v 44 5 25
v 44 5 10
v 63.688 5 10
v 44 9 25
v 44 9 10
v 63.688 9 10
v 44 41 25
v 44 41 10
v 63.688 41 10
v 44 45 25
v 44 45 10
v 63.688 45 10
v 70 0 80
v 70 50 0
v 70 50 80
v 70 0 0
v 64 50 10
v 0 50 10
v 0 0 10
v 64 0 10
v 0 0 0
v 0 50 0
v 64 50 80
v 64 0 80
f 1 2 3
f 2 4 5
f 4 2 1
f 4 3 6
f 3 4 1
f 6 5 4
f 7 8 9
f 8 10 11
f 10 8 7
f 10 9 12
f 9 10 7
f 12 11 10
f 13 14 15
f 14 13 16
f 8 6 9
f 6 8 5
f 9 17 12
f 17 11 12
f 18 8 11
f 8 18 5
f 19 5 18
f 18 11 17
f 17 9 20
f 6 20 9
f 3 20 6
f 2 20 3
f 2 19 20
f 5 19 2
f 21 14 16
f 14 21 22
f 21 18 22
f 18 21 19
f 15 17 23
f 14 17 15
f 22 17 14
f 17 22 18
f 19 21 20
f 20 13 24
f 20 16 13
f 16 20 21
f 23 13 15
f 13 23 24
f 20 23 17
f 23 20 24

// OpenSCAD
$fn = 32;

// ----------------------------------------------------------------------
// Rib bracket: 2-gusset L bracket
// ----------------------------------------------------------------------

// --- parameters (mm) ---
base_l = 70;              // foot length, X
base_w = 50;              // foot width, Y
base_t = 10;              // foot thickness
plate_t = 6;              // upright plate thickness
plate_h = 80;             // overall height
gus_l = 20;               // gusset leg along the foot
gus_h = 16;               // gusset height
gus_t = 4;                // gusset thickness
gus_edge = 5;             // gusset margin from the foot edge
n_gus = 2;                // gusset count

gus_pitch = (base_w - 2 * gus_edge - gus_t) / (n_gus - 1);  // gusset pitch

union() {
  cube([base_l, base_w, base_t]);
  translate([base_l - plate_t, 0, base_t - 1])
    cube([plate_t, base_w, plate_h - base_t + 1]);
  for (i = [0 : n_gus - 1])
    translate([base_l - plate_t - gus_l, gus_edge + i * gus_pitch, base_t - 1])
      rotate([-90, 0, 0])
        linear_extrude(height = gus_t)
          polygon(points = [[0, 0], [gus_l + 1, 0], [0, -gus_h]]);
}
